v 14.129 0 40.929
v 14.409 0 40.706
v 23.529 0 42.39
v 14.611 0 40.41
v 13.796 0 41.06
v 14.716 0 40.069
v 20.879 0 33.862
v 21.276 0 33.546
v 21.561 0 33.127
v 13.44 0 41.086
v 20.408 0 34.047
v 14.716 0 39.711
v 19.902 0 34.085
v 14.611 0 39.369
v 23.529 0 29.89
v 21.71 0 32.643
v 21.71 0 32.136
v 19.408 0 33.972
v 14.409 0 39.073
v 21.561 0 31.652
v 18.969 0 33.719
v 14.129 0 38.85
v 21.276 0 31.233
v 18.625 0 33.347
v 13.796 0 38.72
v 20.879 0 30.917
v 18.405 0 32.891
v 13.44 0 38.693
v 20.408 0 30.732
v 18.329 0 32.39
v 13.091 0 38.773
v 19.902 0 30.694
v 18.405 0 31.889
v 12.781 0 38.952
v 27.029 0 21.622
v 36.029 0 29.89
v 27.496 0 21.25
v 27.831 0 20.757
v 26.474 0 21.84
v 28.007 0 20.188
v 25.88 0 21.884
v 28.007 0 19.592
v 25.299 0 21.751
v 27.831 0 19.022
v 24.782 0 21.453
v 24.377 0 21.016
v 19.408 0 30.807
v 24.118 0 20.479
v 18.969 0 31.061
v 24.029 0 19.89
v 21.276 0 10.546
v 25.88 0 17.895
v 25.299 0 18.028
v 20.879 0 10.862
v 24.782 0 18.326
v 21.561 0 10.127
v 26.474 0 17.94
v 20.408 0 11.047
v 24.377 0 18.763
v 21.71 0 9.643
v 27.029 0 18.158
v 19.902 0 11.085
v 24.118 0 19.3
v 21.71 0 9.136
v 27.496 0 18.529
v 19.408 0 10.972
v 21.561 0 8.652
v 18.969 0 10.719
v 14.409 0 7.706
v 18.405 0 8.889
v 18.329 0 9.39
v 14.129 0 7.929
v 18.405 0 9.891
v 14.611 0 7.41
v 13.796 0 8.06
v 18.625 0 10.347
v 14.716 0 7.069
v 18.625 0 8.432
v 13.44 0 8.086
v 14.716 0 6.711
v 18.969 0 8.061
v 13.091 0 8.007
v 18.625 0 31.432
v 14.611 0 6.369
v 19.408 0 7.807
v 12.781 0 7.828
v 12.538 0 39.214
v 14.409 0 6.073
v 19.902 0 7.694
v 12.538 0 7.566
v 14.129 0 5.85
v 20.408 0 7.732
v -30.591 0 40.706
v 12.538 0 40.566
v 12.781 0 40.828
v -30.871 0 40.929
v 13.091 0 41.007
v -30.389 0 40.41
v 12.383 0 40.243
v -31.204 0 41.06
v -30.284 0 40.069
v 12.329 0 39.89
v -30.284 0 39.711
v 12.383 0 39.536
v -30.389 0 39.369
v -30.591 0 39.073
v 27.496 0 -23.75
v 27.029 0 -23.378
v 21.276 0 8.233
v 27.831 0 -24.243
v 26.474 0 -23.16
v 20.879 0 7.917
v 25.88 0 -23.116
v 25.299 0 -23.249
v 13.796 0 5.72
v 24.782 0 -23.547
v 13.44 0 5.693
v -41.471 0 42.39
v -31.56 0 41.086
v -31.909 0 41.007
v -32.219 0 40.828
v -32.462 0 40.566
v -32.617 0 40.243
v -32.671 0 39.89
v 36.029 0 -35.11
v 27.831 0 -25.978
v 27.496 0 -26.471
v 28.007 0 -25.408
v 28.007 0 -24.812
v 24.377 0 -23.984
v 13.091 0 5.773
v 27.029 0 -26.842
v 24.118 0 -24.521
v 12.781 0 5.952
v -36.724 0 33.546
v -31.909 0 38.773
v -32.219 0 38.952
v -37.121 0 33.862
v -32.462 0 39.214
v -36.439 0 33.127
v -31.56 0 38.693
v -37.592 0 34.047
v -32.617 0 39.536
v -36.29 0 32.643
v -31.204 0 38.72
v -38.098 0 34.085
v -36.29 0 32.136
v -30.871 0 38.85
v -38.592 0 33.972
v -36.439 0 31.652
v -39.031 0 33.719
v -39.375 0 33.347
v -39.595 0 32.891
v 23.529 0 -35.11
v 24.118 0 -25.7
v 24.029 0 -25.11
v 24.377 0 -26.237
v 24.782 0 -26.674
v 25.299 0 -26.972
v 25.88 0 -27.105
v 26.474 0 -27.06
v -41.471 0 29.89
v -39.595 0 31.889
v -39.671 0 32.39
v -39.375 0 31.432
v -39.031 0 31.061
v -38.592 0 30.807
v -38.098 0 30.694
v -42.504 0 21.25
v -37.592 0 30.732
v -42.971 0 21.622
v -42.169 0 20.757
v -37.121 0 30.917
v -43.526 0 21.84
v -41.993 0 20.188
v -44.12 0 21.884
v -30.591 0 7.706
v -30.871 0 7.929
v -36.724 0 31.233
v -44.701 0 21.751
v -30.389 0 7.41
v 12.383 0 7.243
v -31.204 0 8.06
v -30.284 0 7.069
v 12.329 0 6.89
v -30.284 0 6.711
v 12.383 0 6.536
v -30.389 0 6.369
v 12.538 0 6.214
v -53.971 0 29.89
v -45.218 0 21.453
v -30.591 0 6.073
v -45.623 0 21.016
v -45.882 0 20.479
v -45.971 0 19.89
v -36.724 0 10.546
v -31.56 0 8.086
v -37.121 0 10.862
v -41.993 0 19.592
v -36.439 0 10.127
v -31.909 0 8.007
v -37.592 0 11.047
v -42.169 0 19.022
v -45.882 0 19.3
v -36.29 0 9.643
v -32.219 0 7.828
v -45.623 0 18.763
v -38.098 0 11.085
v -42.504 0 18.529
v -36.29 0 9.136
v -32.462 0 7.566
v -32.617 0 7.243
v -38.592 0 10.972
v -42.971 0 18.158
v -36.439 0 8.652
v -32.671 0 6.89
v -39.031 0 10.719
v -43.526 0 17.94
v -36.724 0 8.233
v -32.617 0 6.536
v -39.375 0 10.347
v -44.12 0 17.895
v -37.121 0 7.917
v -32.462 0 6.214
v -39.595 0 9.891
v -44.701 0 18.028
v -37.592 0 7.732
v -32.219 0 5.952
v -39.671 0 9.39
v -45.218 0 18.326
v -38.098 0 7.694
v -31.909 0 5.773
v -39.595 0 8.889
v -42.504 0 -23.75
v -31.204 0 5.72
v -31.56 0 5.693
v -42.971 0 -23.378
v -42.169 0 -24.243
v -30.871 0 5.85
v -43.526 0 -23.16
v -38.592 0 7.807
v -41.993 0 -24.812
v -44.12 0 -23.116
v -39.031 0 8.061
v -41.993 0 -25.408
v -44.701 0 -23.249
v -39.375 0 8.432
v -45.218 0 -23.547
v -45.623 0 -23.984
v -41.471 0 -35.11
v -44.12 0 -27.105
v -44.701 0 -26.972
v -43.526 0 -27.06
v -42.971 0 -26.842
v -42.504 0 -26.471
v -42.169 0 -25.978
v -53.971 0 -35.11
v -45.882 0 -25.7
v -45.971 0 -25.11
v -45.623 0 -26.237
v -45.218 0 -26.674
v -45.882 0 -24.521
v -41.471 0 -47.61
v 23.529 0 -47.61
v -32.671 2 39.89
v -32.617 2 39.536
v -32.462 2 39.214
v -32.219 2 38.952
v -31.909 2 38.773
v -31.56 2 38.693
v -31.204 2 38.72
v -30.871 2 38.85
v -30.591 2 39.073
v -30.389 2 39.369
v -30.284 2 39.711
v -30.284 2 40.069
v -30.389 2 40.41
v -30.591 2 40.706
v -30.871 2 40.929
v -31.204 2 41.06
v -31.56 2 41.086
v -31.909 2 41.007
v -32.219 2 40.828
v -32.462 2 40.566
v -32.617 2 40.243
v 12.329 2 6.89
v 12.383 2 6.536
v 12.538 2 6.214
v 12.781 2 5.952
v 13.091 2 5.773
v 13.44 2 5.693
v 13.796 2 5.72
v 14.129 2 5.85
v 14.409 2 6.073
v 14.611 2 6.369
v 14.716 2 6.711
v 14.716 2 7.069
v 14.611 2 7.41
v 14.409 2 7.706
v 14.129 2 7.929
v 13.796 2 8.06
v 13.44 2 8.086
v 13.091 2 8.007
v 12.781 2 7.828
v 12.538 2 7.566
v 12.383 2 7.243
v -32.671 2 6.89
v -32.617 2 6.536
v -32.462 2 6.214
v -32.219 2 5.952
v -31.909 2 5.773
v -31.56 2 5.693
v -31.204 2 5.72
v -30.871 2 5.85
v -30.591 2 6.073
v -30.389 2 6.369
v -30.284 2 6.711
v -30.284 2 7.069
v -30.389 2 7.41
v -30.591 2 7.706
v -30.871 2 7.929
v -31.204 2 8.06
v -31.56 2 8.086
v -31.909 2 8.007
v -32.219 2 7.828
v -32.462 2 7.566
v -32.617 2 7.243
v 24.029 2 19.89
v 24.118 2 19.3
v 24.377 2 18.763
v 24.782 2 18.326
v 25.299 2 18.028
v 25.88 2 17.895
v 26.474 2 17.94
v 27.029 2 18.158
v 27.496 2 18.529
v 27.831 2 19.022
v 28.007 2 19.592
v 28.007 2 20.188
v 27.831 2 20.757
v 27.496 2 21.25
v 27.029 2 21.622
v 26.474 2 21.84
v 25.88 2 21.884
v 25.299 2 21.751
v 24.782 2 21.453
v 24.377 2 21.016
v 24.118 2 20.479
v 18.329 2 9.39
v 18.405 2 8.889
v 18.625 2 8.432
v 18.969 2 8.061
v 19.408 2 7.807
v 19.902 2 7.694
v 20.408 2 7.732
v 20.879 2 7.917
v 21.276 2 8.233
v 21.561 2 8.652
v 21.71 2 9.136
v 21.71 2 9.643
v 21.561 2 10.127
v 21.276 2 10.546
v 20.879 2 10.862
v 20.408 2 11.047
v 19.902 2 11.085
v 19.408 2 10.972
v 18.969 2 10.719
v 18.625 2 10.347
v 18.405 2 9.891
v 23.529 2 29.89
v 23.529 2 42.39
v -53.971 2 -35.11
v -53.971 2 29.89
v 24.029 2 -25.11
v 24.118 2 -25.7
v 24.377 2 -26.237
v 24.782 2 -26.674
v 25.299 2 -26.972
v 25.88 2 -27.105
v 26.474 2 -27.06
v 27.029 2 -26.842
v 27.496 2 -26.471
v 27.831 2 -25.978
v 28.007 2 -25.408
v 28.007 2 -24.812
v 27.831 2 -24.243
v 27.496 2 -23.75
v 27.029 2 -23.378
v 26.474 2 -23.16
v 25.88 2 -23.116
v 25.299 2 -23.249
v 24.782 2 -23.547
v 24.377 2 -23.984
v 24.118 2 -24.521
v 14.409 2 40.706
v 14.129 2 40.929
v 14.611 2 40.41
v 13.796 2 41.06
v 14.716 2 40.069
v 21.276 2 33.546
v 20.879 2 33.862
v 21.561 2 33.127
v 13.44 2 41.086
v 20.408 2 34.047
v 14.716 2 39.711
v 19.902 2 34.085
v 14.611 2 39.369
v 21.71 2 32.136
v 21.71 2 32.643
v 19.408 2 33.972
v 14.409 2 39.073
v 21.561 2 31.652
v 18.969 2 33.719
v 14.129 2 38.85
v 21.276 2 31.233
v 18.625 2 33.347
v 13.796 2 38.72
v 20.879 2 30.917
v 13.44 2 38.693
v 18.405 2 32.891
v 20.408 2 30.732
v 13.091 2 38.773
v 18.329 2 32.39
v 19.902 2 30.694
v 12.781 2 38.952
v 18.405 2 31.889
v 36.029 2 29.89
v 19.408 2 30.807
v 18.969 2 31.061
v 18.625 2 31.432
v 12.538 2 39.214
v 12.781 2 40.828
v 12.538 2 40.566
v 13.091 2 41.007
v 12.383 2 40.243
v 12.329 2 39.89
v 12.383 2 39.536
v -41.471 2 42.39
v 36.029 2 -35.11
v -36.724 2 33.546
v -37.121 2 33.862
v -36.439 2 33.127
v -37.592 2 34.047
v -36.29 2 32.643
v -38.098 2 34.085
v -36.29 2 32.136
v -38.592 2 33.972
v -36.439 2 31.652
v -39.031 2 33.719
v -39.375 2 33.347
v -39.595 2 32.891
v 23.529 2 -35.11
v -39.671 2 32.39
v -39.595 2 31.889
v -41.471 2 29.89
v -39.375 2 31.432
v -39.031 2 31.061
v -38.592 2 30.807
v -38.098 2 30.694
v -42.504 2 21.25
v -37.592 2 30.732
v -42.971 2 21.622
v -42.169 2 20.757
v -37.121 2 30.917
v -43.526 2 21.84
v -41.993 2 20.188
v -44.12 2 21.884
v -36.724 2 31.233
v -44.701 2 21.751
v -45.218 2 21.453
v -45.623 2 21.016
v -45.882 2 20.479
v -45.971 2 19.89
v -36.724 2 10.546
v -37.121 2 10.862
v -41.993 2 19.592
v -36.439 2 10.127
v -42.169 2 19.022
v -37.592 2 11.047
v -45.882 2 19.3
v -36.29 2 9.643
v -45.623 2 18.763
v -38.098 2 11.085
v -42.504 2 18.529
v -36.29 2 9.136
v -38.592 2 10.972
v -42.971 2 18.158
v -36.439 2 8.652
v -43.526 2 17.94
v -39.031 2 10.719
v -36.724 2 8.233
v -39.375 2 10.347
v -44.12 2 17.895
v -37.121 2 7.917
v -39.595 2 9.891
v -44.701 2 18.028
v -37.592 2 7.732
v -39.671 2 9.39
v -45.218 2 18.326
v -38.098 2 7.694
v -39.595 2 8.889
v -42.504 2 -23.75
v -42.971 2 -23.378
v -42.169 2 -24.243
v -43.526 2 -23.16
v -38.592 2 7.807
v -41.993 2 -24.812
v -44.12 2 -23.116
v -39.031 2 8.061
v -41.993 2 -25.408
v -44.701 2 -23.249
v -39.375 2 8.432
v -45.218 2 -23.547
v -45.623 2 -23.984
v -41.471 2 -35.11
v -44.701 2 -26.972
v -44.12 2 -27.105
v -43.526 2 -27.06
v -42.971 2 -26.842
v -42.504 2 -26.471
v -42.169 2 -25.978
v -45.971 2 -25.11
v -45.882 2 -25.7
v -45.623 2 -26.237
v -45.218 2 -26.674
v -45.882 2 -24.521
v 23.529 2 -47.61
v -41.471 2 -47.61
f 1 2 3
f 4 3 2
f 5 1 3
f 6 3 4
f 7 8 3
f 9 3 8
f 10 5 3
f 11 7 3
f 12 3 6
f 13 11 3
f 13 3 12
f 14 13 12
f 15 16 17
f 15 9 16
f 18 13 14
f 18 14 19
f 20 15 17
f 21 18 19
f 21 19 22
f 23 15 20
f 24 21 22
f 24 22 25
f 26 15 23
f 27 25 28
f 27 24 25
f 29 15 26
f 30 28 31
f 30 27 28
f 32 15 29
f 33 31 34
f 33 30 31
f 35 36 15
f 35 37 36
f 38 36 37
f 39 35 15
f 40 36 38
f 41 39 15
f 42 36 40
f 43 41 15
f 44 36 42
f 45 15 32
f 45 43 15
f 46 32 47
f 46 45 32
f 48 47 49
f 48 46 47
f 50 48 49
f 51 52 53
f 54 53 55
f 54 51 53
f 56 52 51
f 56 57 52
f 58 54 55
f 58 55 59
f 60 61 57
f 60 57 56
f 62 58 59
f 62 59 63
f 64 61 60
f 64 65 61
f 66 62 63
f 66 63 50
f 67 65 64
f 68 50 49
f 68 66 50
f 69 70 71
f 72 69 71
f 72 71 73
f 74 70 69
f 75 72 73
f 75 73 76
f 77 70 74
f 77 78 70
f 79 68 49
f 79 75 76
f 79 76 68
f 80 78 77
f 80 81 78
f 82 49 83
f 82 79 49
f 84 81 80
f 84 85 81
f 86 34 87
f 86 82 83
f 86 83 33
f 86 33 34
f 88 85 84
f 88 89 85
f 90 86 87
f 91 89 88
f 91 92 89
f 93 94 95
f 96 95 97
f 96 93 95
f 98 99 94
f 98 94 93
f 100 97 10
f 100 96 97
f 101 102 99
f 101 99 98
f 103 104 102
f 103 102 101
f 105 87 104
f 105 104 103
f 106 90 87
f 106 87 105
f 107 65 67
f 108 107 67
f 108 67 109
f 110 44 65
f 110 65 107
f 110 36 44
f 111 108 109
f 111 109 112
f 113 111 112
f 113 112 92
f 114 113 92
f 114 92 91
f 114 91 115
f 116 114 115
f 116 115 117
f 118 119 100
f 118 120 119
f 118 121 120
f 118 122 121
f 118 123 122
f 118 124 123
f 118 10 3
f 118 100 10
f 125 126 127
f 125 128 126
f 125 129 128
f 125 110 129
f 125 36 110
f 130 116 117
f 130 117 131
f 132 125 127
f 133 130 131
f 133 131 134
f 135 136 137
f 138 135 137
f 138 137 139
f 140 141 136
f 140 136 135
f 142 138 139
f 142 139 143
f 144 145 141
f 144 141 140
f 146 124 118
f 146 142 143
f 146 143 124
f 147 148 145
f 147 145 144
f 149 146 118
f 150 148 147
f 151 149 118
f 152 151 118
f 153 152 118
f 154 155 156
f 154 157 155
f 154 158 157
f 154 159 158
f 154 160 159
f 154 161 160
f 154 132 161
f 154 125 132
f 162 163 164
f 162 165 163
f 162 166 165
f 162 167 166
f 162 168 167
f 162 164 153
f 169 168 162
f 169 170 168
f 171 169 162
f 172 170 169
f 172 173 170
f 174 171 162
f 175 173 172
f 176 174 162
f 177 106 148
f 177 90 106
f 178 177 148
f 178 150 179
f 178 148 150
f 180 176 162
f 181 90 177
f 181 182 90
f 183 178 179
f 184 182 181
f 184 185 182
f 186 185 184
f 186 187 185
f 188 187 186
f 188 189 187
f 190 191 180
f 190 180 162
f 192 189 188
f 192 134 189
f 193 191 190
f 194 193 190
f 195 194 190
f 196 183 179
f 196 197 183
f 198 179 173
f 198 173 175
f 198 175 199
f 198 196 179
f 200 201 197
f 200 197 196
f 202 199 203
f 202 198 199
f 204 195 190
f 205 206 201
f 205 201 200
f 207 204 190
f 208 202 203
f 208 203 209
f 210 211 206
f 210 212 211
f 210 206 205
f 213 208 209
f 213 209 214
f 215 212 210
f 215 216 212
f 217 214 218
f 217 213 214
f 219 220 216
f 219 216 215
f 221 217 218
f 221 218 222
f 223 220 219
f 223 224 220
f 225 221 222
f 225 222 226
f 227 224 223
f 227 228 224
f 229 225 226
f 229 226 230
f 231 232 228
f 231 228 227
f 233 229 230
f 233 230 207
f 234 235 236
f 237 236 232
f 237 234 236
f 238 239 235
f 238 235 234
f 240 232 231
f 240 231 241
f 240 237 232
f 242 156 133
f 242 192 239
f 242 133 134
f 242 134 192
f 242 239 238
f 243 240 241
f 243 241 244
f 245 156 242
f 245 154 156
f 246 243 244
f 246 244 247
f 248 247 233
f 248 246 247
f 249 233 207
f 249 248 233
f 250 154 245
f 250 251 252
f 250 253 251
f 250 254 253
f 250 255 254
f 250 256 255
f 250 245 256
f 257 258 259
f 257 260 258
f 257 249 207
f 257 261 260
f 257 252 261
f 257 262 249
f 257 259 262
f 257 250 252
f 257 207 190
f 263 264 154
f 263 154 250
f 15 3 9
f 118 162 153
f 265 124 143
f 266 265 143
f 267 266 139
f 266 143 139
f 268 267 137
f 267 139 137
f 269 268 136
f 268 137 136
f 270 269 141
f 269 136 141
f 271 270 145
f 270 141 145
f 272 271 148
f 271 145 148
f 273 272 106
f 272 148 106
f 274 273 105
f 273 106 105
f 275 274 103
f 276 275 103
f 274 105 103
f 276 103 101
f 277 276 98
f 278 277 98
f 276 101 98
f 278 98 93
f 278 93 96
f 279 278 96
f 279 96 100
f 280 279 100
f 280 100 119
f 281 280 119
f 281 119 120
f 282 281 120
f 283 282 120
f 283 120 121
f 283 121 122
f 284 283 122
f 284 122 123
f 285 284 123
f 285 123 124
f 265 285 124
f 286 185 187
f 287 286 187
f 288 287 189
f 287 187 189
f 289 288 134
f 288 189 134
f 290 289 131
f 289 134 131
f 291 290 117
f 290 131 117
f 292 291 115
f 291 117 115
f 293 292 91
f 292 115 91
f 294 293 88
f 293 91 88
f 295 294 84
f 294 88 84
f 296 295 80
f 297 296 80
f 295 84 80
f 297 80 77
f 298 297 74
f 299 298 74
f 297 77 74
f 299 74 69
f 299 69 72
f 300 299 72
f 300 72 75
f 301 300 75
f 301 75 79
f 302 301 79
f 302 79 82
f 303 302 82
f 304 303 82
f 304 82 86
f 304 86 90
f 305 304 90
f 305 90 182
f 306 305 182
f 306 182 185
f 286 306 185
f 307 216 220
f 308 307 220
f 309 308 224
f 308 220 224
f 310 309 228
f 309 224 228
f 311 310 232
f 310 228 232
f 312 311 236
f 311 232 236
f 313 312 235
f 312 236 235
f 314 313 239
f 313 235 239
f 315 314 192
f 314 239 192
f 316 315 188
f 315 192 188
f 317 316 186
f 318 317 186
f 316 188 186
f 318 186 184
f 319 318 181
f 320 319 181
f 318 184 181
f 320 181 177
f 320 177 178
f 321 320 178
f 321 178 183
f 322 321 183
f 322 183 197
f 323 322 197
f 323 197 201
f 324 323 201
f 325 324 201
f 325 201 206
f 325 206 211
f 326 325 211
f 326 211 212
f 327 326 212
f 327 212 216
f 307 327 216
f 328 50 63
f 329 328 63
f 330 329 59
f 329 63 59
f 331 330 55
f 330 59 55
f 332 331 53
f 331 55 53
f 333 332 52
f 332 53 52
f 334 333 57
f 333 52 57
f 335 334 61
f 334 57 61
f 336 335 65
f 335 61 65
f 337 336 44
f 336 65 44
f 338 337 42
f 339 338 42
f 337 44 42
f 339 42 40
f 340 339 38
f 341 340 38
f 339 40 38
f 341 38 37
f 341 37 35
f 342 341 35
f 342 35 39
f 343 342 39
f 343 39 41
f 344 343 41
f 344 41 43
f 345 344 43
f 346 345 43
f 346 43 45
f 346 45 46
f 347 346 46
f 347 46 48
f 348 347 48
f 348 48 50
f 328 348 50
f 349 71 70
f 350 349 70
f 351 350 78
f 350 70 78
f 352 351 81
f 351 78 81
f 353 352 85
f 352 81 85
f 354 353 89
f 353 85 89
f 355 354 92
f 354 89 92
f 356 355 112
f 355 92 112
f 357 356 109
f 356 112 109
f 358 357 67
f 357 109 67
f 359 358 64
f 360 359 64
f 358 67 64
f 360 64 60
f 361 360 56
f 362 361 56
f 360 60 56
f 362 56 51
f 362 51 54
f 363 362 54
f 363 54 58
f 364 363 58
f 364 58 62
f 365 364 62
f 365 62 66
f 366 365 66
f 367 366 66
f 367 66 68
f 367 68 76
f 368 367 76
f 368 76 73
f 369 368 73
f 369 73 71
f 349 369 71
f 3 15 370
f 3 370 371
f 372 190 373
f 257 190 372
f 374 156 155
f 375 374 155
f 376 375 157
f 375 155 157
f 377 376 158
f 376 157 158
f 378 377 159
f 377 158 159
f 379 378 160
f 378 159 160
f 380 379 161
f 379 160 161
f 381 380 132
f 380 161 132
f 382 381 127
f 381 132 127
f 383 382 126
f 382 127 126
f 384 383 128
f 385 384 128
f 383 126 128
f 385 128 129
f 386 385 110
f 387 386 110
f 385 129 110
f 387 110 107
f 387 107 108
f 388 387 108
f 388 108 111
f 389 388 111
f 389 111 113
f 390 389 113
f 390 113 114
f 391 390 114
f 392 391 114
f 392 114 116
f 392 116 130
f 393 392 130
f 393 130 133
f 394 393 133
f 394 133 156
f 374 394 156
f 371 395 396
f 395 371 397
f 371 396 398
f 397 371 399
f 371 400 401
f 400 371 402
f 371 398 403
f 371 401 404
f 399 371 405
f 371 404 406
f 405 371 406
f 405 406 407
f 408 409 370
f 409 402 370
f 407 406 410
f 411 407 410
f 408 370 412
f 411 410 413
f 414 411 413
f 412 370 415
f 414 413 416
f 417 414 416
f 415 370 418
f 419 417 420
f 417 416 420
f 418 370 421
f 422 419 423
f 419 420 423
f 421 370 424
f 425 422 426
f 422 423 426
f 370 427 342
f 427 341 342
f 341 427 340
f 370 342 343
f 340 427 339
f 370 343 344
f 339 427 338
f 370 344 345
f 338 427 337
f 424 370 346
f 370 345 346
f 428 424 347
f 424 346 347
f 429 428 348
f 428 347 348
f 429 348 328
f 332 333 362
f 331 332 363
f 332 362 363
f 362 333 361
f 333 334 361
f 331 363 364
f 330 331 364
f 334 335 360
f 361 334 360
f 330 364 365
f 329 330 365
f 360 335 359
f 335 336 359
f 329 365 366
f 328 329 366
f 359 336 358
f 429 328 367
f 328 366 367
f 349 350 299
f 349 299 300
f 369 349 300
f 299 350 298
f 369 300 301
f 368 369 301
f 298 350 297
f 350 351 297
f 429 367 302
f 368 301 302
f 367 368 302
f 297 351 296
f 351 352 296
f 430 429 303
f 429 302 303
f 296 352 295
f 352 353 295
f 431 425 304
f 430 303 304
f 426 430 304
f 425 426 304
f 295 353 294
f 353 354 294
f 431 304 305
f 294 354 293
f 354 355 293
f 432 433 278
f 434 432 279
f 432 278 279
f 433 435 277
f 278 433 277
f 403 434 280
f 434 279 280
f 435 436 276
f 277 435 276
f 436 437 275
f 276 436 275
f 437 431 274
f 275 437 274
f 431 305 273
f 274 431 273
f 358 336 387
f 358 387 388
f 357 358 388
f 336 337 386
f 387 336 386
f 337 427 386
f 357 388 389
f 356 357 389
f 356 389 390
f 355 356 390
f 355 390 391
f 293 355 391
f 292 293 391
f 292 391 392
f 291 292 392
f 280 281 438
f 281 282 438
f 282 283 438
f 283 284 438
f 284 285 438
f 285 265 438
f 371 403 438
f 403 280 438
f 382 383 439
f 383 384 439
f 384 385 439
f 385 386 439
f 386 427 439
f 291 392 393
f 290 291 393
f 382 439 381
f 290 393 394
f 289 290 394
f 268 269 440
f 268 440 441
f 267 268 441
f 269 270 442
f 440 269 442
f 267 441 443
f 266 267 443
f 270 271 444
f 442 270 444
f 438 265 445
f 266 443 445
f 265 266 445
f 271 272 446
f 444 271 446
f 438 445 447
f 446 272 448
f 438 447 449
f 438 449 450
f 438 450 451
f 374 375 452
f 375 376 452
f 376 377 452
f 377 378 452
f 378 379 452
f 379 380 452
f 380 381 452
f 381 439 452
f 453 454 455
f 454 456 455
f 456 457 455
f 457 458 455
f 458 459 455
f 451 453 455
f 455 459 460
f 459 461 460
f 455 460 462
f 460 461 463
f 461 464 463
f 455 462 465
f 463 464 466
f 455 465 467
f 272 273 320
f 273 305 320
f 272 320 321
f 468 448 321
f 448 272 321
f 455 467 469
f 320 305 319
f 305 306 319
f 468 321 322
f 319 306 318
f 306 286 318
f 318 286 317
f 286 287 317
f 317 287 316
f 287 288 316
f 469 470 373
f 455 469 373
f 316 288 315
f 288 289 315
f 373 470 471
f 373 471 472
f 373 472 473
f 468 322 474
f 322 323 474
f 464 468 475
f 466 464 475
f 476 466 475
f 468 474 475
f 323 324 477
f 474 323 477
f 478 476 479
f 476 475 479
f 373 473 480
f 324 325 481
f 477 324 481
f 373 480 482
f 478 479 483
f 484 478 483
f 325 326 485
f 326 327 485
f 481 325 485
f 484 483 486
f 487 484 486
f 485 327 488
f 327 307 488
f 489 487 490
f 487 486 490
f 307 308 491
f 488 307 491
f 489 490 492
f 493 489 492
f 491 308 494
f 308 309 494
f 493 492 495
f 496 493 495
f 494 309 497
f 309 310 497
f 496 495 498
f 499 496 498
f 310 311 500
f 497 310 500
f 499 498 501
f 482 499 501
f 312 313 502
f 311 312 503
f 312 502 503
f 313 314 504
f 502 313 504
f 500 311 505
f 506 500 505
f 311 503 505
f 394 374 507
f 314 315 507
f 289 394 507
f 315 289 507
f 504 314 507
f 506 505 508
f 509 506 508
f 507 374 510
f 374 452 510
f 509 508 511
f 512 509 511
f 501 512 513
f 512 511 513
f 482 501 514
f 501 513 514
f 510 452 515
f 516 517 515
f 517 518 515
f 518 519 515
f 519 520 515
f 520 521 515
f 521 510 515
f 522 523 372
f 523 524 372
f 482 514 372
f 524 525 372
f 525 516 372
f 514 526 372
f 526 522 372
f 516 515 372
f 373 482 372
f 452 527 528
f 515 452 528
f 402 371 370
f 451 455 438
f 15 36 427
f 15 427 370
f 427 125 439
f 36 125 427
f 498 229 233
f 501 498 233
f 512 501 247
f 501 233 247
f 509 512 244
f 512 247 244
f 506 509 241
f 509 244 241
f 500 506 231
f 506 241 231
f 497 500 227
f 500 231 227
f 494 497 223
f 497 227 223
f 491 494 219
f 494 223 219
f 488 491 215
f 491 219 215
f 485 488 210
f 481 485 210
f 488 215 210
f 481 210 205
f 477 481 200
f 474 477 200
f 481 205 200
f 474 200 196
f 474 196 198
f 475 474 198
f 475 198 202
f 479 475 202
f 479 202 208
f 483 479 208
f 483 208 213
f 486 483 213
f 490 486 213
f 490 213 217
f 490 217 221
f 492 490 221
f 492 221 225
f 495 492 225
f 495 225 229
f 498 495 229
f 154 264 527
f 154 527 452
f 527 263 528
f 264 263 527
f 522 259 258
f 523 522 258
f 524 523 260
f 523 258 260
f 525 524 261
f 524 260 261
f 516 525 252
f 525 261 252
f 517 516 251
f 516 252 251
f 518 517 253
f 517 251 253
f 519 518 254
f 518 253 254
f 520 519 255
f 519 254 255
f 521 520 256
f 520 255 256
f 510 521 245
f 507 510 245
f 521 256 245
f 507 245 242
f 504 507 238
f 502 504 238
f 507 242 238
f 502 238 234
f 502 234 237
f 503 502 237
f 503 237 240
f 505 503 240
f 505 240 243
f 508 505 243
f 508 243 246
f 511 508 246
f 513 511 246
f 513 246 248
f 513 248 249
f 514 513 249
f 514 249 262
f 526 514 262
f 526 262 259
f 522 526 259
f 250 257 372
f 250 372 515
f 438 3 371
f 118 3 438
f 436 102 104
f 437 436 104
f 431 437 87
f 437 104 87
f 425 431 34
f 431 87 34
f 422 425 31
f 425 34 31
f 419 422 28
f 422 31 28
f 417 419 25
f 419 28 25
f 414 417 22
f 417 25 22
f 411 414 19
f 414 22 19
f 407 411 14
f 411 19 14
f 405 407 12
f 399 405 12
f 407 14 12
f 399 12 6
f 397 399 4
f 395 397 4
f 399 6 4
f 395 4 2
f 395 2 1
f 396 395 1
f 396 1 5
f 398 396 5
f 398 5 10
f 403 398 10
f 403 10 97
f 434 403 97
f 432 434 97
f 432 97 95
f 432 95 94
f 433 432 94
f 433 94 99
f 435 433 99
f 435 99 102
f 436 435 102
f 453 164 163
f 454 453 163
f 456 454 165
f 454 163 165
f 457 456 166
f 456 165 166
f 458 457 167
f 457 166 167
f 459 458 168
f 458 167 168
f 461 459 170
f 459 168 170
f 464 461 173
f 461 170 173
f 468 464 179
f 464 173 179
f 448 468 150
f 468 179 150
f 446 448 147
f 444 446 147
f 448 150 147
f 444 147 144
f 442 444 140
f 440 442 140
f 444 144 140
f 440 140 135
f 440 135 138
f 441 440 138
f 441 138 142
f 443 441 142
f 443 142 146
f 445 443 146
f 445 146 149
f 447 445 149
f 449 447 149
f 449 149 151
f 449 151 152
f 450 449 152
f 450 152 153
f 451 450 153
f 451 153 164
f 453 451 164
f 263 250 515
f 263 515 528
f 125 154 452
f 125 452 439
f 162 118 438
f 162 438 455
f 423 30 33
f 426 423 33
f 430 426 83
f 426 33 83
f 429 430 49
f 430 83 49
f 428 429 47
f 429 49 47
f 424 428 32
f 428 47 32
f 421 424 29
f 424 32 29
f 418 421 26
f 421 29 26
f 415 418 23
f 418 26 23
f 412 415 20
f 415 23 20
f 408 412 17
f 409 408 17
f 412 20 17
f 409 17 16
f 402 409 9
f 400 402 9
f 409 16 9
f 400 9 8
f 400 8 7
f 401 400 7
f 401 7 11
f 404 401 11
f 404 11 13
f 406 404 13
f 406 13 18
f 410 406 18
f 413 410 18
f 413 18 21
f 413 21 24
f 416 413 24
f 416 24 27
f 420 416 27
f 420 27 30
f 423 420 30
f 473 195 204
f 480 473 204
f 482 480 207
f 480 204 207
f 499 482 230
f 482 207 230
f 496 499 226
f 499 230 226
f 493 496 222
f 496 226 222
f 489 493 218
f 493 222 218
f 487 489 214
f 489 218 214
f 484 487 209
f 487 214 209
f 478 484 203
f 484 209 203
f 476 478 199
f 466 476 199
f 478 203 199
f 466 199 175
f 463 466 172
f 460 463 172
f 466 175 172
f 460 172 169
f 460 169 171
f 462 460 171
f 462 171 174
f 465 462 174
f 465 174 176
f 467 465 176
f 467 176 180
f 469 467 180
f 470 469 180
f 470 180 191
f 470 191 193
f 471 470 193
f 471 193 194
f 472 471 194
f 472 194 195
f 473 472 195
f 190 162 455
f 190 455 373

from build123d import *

# Parameters (mm, degrees)
BOSS_EXTRUDE1_DEPTH      = 2
F_4_0MM_DOWEL_HOLE1_D    = 4
M3_CLEARANCE_HOLE1_D     = 3.4
M3_CLEARANCE_HOLE1_DEPTH = 10
M3_CLEARANCE_HOLE1_TIP   = 1.021463052
M2_CLEARANCE_HOLE1_D     = 2.4
M2_CLEARANCE_HOLE1_DEPTH = 10
M2_CLEARANCE_HOLE1_TIP   = 0.721032743


with BuildPart() as part:
    # Sketch1 → Boss-Extrude1 (new body)
    with BuildSketch(Plane(origin=(0, 0, 0), x_dir=(1, 0, 0), z_dir=(0, 1, 0))):
        Polygon((-53.970588235, 35.110294118), (-41.470588235, 35.110294118), (-41.470588235, 47.610294118), (23.529411765, 47.610294118), (23.529411765, 35.110294118), (36.029411765, 35.110294118), (36.029411765, -29.889705882), (23.529411765, -29.889705882), (23.529411765, -42.389705882), (-41.470588235, -42.389705882), (-41.470588235, -29.889705882), (-53.970588235, -29.889705882), align=None)
    extrude(amount=BOSS_EXTRUDE1_DEPTH)

    # Ø4.0mm Dowel Hole1 (through all)
    with Locations(Plane(origin=(0, 2, 0), x_dir=(1, 0, 0), z_dir=(0, 1, 0))):
        with Locations((-43.970588235, 25.110294118), (26.029411765, 25.110294118), (-43.970588235, -19.889705882), (26.029411765, -19.889705882)):
            Hole(F_4_0MM_DOWEL_HOLE1_D / 2)

    # M3 Clearance Hole1
    with Locations(Plane(origin=(0, 2, 0), x_dir=(1, 0, 0), z_dir=(0, 1, 0))):
        with Locations((-37.970588235, -9.389705882), (-37.970588235, -32.389705882), (20.029411765, -32.389705882), (20.029411765, -9.389705882)):
            Hole(M3_CLEARANCE_HOLE1_D / 2, depth=M3_CLEARANCE_HOLE1_DEPTH)
            with Locations((0, 0, -(M3_CLEARANCE_HOLE1_DEPTH + M3_CLEARANCE_HOLE1_TIP / 2))):  # 118° drill point
                Cone(0, M3_CLEARANCE_HOLE1_D / 2, M3_CLEARANCE_HOLE1_TIP, mode=Mode.SUBTRACT)

    # M2 Clearance Hole1
    with Locations(Plane(origin=(0, 2, 0), x_dir=(1, 0, 0), z_dir=(0, 1, 0))):
        with Locations((-31.470588235, -39.889705882), (-31.470588235, -6.889705882), (13.529411765, -39.889705882), (13.529411765, -6.889705882)):
            Hole(M2_CLEARANCE_HOLE1_D / 2, depth=M2_CLEARANCE_HOLE1_DEPTH)
            with Locations((0, 0, -(M2_CLEARANCE_HOLE1_DEPTH + M2_CLEARANCE_HOLE1_TIP / 2))):  # 118° drill point
                Cone(0, M2_CLEARANCE_HOLE1_D / 2, M2_CLEARANCE_HOLE1_TIP, mode=Mode.SUBTRACT)


solid = part.part
